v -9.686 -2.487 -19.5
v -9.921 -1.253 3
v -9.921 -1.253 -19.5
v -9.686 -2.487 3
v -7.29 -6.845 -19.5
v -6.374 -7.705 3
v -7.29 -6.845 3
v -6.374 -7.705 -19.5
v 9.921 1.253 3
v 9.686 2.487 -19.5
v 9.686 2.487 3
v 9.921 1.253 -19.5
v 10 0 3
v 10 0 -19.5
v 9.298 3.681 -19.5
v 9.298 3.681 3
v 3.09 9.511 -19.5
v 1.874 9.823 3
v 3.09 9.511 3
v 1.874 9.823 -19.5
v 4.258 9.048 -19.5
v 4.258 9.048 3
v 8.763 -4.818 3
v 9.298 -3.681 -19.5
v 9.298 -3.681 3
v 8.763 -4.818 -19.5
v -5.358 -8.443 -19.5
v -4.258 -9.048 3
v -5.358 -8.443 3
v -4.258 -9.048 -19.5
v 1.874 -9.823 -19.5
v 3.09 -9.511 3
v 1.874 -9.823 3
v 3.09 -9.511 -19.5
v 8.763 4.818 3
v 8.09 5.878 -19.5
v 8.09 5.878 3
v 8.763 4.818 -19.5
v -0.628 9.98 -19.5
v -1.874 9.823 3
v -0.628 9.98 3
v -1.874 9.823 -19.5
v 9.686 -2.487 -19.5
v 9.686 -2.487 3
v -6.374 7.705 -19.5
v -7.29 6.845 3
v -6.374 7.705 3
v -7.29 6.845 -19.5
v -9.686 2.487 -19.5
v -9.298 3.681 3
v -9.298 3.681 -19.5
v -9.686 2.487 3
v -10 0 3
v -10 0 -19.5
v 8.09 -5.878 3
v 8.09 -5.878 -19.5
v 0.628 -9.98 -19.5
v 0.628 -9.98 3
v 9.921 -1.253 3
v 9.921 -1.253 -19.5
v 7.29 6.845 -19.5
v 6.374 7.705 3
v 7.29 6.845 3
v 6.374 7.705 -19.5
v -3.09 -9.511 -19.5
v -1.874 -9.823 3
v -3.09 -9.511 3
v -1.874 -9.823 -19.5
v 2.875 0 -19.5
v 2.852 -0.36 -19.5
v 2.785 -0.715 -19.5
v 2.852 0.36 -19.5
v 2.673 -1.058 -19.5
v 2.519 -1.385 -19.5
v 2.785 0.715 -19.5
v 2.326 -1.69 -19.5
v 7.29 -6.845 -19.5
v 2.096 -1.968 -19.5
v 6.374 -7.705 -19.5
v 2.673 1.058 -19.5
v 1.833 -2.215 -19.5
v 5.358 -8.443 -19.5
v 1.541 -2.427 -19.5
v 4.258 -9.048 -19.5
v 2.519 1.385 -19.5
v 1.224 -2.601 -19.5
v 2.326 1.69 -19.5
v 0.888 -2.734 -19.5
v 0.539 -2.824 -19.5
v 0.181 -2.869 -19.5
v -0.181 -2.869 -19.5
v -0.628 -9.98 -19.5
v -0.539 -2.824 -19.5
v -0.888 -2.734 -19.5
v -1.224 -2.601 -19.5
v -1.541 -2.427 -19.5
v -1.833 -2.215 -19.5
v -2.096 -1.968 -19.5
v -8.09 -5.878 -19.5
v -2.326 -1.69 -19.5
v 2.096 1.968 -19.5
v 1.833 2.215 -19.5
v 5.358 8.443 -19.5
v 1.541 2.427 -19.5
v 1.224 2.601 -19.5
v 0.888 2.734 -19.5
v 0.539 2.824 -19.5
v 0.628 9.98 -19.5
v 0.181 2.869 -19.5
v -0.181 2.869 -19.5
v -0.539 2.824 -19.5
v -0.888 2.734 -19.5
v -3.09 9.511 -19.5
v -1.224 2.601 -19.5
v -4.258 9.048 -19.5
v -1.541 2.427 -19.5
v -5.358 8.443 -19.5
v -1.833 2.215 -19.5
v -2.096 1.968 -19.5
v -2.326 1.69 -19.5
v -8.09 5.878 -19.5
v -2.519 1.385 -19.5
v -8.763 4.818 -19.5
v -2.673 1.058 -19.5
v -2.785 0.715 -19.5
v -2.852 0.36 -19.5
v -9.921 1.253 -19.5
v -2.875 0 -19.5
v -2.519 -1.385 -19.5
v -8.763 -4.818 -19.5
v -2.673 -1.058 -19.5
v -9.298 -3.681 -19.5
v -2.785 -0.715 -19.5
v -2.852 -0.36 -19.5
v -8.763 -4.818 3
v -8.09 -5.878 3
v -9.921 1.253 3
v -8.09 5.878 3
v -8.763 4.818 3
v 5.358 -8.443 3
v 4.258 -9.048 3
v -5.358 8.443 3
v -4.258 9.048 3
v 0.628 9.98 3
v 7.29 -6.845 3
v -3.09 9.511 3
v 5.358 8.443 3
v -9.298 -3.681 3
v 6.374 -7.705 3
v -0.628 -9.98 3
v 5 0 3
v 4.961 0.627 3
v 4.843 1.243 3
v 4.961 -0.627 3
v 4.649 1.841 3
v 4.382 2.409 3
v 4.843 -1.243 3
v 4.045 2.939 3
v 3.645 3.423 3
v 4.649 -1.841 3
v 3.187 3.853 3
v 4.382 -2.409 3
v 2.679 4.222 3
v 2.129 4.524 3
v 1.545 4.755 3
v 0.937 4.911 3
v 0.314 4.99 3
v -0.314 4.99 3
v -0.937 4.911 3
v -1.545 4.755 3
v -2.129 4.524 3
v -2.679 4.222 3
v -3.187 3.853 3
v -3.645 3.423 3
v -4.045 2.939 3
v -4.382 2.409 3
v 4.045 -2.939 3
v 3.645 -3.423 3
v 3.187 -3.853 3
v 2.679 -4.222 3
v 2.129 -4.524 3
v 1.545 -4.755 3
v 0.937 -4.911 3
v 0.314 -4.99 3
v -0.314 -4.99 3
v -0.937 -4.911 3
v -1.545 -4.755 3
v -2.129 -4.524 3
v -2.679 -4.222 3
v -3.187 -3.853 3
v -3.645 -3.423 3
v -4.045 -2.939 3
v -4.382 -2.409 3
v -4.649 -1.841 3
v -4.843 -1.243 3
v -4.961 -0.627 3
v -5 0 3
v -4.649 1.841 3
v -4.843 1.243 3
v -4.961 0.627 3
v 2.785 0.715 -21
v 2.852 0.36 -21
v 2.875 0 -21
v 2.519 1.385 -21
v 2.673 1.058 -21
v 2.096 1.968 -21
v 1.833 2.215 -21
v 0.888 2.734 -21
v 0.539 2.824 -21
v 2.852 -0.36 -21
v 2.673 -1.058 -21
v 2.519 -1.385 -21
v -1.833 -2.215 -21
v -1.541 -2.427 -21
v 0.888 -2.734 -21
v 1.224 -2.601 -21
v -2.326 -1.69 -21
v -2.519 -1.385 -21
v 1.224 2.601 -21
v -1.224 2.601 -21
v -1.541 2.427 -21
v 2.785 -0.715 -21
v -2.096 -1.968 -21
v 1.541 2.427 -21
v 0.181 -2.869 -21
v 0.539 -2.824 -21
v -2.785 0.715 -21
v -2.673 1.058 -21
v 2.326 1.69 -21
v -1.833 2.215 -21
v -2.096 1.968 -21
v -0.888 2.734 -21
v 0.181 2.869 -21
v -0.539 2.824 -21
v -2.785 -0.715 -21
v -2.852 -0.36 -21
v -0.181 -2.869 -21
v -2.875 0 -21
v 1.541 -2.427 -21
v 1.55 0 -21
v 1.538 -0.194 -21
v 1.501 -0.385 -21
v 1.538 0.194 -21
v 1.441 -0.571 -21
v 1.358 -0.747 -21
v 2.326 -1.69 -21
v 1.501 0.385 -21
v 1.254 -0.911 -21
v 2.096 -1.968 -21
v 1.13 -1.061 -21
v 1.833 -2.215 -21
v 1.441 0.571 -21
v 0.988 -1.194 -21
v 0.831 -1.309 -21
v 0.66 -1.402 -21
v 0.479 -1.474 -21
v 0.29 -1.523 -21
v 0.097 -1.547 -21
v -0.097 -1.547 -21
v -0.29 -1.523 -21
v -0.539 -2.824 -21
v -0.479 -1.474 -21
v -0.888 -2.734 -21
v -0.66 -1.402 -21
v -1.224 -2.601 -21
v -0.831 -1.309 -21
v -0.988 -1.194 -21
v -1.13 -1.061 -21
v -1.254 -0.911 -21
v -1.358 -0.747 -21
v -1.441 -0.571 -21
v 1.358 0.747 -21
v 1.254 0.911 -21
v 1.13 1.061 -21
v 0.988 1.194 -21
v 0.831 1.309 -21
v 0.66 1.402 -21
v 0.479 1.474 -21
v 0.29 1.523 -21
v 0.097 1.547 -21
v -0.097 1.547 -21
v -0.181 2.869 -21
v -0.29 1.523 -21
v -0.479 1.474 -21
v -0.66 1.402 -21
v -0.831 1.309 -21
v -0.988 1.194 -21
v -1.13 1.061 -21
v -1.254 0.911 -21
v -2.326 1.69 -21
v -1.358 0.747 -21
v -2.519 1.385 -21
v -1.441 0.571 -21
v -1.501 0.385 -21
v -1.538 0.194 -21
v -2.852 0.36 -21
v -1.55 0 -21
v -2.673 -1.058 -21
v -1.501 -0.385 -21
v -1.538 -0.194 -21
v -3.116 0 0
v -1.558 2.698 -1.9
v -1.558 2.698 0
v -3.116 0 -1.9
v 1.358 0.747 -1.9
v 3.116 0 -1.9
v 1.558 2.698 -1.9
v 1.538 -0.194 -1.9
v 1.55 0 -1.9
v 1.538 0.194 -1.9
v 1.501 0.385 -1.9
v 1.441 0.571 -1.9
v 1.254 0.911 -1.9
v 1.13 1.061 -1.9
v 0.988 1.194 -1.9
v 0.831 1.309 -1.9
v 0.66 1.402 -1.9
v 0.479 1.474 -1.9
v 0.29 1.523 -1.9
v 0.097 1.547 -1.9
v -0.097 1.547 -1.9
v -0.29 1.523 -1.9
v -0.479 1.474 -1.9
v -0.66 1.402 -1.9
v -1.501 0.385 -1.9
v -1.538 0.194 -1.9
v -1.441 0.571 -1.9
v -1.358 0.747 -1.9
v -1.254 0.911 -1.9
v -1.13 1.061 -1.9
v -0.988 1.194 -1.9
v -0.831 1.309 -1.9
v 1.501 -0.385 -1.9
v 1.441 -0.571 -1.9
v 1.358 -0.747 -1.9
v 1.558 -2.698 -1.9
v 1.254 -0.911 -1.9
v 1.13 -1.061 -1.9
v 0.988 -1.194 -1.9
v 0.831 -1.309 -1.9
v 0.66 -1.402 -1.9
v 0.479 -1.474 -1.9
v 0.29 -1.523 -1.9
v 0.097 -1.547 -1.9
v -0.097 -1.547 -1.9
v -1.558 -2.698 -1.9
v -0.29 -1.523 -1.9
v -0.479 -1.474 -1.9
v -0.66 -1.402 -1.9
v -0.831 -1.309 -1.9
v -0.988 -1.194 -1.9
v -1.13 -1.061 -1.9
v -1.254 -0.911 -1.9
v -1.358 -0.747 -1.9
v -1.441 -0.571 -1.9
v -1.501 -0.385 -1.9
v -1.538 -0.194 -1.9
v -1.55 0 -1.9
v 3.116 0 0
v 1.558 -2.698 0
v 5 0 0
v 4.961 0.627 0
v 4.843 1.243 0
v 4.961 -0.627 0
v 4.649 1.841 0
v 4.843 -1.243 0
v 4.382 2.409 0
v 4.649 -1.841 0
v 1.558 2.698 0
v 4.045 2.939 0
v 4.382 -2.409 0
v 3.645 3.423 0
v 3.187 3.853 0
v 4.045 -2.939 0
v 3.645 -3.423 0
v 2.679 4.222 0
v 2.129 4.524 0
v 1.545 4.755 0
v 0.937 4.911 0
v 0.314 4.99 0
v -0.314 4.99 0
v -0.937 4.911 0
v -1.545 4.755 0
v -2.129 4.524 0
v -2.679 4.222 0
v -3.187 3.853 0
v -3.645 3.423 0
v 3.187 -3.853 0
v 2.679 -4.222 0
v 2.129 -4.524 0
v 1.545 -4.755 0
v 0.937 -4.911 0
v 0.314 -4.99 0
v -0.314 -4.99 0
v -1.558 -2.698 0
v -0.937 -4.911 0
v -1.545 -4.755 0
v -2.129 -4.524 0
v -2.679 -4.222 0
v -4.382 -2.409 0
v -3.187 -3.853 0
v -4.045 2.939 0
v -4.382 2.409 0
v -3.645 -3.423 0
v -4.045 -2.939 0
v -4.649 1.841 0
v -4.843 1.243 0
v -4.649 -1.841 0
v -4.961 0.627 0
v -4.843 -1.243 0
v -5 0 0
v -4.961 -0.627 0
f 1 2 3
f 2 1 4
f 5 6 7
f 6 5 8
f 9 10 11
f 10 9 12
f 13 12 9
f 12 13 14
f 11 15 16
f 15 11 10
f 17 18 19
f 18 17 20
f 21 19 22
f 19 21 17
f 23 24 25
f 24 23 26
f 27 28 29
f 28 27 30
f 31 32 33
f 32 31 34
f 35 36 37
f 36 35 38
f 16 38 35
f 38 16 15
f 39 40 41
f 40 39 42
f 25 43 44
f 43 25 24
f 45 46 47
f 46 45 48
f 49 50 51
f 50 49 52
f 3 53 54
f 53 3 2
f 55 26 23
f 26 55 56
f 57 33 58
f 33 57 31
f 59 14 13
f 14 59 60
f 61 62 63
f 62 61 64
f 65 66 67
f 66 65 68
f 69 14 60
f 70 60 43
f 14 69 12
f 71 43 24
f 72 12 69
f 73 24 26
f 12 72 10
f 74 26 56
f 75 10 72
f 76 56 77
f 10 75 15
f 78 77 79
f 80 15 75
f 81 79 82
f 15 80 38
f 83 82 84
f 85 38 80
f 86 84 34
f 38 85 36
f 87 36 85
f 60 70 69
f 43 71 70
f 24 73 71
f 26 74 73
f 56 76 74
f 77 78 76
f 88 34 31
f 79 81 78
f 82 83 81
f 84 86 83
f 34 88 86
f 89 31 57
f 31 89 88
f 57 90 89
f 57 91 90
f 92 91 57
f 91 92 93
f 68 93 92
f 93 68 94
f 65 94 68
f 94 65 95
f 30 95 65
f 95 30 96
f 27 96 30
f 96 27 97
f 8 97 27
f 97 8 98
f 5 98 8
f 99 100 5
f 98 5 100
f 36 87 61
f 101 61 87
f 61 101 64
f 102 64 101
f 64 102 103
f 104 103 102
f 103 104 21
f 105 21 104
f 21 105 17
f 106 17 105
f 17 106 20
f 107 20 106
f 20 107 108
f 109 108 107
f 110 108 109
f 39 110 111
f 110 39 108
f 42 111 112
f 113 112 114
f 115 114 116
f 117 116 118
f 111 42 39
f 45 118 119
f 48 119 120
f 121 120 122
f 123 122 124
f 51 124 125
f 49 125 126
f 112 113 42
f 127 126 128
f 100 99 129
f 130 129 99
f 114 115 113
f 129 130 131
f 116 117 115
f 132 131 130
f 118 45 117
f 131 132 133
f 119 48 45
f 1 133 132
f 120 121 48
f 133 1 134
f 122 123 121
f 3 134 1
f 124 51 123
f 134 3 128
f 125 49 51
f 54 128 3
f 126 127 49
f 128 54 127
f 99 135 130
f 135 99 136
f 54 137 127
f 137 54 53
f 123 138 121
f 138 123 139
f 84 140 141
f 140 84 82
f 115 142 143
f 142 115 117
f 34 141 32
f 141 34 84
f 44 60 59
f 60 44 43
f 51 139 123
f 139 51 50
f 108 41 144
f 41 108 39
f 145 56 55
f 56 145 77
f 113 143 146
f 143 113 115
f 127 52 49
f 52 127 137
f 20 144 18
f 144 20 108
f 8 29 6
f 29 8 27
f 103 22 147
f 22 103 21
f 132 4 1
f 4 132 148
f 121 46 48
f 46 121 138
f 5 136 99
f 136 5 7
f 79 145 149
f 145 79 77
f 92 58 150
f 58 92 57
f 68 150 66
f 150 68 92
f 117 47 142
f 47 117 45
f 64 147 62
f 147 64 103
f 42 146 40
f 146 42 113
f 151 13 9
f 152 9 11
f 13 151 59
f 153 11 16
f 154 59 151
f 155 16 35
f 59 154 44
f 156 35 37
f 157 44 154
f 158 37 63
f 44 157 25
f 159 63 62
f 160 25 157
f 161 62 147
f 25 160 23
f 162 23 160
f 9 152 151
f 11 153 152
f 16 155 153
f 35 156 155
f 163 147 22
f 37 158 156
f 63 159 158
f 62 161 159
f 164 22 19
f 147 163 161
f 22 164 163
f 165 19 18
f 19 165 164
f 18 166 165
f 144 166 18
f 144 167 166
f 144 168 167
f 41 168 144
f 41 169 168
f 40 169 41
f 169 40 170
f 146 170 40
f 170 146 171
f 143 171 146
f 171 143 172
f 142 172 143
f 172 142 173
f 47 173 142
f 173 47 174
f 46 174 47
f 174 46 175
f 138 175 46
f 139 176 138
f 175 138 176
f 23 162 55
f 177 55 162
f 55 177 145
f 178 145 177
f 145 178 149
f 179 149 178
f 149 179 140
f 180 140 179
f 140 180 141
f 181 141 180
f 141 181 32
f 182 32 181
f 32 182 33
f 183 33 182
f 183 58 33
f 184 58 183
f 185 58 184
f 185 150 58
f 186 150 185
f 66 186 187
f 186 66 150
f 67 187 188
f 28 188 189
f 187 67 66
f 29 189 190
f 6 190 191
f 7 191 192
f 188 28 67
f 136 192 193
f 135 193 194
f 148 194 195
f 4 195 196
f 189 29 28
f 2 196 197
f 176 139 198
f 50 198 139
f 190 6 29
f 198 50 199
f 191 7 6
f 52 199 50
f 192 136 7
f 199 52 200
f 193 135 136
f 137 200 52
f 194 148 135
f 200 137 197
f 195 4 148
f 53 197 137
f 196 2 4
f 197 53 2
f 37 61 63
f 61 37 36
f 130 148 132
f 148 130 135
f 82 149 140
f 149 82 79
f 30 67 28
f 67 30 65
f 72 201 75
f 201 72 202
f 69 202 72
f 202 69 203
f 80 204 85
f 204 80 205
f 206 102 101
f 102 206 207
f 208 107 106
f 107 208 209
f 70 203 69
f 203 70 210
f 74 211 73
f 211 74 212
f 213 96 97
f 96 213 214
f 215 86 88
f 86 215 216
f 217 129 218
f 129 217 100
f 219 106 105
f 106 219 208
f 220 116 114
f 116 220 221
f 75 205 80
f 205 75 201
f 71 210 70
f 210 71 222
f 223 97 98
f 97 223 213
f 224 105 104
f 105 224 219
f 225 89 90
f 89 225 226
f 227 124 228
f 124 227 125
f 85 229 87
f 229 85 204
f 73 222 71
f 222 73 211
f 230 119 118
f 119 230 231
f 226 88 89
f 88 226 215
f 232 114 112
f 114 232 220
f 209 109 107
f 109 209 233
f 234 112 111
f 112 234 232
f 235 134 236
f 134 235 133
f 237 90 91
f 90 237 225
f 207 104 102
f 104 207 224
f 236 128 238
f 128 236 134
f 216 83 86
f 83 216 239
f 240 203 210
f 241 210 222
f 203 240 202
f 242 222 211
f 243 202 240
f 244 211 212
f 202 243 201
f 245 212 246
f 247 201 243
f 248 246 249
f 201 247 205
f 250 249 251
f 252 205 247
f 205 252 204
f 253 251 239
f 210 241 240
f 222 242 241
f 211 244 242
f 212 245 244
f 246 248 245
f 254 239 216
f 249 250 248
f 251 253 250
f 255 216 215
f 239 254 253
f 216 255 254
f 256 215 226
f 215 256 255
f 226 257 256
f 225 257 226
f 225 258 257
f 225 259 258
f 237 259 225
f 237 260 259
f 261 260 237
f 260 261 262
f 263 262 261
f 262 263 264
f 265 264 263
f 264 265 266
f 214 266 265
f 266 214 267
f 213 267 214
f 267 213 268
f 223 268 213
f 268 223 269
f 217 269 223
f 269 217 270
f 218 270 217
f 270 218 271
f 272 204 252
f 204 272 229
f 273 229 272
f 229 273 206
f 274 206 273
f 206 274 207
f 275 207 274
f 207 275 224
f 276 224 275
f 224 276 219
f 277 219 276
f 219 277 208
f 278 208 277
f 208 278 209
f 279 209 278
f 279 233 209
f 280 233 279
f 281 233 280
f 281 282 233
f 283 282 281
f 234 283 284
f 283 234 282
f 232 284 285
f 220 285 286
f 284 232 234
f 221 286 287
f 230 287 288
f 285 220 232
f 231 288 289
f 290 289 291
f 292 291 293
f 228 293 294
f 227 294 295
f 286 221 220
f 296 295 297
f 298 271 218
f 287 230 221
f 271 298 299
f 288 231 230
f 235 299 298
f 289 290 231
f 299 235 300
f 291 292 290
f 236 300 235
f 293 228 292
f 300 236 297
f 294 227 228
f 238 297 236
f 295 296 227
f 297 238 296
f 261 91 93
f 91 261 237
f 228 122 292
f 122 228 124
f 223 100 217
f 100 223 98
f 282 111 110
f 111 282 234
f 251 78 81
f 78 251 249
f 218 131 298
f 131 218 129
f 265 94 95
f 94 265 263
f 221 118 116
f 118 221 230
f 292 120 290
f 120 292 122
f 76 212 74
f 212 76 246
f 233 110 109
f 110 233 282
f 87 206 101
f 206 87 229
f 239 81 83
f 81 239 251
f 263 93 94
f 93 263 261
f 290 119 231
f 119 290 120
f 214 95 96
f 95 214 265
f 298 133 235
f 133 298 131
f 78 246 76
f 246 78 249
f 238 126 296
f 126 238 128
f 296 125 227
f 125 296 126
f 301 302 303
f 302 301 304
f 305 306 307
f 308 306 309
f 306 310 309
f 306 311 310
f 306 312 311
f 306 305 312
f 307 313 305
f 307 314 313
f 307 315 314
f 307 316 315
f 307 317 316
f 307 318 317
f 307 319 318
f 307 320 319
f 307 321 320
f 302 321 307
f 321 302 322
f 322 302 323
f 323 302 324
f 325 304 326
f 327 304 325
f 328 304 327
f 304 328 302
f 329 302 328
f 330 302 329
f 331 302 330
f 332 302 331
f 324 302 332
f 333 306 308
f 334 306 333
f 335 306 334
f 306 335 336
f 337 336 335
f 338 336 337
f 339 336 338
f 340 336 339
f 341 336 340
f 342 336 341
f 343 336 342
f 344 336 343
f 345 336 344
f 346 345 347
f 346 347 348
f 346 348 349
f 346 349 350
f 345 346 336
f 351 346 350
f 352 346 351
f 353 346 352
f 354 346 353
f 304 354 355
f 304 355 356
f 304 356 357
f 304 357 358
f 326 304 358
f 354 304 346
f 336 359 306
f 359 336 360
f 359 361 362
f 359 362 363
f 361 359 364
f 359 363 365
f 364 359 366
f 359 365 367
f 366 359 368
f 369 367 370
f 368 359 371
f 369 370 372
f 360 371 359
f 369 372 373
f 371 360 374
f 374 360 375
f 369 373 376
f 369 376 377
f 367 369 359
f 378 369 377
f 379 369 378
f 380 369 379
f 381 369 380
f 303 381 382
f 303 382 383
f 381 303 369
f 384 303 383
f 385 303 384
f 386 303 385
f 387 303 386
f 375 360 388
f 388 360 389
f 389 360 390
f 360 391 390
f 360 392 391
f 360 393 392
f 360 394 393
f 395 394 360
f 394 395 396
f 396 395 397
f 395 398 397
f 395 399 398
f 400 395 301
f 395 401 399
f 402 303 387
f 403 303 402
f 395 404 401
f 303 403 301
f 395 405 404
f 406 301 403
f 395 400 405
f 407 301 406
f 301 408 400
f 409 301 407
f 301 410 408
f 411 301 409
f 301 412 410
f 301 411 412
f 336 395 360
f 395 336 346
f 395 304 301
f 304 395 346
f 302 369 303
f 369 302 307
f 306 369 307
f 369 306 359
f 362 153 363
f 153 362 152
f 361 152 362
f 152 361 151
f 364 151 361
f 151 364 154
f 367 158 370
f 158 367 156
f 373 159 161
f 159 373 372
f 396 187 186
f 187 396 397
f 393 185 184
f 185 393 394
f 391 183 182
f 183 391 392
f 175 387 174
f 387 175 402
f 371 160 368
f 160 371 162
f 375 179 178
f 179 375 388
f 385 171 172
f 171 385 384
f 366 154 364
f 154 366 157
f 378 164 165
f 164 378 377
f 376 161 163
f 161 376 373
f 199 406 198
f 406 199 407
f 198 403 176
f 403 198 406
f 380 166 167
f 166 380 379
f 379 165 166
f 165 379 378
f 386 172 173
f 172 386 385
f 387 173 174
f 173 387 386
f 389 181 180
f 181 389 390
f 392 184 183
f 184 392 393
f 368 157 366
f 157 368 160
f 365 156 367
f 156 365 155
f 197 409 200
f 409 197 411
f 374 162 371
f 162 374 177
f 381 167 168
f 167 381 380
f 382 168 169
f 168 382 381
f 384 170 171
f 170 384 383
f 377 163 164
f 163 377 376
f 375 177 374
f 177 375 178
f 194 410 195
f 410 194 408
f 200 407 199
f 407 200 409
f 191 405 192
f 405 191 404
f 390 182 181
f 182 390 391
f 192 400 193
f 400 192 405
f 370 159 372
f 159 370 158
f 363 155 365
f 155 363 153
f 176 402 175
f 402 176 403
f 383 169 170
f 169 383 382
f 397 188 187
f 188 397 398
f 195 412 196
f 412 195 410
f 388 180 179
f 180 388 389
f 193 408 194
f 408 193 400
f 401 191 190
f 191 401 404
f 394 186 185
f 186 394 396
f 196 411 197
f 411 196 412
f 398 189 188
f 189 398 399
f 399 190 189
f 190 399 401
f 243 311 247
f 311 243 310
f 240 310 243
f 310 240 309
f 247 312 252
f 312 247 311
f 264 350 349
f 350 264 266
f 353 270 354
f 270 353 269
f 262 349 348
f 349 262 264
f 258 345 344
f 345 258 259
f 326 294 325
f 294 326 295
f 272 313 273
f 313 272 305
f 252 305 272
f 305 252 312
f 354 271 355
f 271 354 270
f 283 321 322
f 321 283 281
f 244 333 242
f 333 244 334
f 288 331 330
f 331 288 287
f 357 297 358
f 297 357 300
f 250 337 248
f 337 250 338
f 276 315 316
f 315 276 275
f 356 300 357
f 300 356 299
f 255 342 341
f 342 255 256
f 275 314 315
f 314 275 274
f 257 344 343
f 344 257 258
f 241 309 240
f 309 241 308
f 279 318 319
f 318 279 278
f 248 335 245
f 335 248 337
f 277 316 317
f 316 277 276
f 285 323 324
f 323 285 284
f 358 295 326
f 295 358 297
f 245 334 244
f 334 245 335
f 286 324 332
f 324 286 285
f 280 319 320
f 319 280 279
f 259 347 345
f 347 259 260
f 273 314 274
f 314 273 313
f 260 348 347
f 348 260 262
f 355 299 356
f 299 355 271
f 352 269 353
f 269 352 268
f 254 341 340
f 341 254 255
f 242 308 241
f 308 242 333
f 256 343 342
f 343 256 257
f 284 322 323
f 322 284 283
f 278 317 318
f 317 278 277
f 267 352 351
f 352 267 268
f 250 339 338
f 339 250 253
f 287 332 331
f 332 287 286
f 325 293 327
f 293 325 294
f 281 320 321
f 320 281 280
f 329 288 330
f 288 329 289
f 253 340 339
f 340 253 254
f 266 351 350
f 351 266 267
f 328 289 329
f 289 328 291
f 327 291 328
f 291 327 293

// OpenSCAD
$fn = 50;

difference() {
	union() {
		translate(v = [0, 0, -19.5]) {
			cylinder(h = 22.5, r = 10.0);
		}
		#translate(v = [0, 0, -21.0]) {
			cylinder(h = 21, r = 2.875);
		}
	}
	union() {
		translate(v = [0, 0, 0]) {
			rotate(a = [0, 0, 0]) {
				difference() {
					union() {
						translate(v = [0, 0, -1.9]) {
							linear_extrude(height = 1.9) {
								polygon(points = [[3.1158, 0.0], [1.5579000000000005, 2.698361953111554], [-1.5578999999999994, 2.6983619531115544], [-3.1158, 3.815754496783323e-16], [-1.5579000000000014, -2.6983619531115535], [1.557899999999998, -2.6983619531115552]]);
							}
						}
					}
					union();
				}
			}
		}
		#cylinder(h = 3, r = 5.0);
		#translate(v = [0, 0, -100.0]) {
			cylinder(h = 200, r = 1.55);
		}
	}
}
